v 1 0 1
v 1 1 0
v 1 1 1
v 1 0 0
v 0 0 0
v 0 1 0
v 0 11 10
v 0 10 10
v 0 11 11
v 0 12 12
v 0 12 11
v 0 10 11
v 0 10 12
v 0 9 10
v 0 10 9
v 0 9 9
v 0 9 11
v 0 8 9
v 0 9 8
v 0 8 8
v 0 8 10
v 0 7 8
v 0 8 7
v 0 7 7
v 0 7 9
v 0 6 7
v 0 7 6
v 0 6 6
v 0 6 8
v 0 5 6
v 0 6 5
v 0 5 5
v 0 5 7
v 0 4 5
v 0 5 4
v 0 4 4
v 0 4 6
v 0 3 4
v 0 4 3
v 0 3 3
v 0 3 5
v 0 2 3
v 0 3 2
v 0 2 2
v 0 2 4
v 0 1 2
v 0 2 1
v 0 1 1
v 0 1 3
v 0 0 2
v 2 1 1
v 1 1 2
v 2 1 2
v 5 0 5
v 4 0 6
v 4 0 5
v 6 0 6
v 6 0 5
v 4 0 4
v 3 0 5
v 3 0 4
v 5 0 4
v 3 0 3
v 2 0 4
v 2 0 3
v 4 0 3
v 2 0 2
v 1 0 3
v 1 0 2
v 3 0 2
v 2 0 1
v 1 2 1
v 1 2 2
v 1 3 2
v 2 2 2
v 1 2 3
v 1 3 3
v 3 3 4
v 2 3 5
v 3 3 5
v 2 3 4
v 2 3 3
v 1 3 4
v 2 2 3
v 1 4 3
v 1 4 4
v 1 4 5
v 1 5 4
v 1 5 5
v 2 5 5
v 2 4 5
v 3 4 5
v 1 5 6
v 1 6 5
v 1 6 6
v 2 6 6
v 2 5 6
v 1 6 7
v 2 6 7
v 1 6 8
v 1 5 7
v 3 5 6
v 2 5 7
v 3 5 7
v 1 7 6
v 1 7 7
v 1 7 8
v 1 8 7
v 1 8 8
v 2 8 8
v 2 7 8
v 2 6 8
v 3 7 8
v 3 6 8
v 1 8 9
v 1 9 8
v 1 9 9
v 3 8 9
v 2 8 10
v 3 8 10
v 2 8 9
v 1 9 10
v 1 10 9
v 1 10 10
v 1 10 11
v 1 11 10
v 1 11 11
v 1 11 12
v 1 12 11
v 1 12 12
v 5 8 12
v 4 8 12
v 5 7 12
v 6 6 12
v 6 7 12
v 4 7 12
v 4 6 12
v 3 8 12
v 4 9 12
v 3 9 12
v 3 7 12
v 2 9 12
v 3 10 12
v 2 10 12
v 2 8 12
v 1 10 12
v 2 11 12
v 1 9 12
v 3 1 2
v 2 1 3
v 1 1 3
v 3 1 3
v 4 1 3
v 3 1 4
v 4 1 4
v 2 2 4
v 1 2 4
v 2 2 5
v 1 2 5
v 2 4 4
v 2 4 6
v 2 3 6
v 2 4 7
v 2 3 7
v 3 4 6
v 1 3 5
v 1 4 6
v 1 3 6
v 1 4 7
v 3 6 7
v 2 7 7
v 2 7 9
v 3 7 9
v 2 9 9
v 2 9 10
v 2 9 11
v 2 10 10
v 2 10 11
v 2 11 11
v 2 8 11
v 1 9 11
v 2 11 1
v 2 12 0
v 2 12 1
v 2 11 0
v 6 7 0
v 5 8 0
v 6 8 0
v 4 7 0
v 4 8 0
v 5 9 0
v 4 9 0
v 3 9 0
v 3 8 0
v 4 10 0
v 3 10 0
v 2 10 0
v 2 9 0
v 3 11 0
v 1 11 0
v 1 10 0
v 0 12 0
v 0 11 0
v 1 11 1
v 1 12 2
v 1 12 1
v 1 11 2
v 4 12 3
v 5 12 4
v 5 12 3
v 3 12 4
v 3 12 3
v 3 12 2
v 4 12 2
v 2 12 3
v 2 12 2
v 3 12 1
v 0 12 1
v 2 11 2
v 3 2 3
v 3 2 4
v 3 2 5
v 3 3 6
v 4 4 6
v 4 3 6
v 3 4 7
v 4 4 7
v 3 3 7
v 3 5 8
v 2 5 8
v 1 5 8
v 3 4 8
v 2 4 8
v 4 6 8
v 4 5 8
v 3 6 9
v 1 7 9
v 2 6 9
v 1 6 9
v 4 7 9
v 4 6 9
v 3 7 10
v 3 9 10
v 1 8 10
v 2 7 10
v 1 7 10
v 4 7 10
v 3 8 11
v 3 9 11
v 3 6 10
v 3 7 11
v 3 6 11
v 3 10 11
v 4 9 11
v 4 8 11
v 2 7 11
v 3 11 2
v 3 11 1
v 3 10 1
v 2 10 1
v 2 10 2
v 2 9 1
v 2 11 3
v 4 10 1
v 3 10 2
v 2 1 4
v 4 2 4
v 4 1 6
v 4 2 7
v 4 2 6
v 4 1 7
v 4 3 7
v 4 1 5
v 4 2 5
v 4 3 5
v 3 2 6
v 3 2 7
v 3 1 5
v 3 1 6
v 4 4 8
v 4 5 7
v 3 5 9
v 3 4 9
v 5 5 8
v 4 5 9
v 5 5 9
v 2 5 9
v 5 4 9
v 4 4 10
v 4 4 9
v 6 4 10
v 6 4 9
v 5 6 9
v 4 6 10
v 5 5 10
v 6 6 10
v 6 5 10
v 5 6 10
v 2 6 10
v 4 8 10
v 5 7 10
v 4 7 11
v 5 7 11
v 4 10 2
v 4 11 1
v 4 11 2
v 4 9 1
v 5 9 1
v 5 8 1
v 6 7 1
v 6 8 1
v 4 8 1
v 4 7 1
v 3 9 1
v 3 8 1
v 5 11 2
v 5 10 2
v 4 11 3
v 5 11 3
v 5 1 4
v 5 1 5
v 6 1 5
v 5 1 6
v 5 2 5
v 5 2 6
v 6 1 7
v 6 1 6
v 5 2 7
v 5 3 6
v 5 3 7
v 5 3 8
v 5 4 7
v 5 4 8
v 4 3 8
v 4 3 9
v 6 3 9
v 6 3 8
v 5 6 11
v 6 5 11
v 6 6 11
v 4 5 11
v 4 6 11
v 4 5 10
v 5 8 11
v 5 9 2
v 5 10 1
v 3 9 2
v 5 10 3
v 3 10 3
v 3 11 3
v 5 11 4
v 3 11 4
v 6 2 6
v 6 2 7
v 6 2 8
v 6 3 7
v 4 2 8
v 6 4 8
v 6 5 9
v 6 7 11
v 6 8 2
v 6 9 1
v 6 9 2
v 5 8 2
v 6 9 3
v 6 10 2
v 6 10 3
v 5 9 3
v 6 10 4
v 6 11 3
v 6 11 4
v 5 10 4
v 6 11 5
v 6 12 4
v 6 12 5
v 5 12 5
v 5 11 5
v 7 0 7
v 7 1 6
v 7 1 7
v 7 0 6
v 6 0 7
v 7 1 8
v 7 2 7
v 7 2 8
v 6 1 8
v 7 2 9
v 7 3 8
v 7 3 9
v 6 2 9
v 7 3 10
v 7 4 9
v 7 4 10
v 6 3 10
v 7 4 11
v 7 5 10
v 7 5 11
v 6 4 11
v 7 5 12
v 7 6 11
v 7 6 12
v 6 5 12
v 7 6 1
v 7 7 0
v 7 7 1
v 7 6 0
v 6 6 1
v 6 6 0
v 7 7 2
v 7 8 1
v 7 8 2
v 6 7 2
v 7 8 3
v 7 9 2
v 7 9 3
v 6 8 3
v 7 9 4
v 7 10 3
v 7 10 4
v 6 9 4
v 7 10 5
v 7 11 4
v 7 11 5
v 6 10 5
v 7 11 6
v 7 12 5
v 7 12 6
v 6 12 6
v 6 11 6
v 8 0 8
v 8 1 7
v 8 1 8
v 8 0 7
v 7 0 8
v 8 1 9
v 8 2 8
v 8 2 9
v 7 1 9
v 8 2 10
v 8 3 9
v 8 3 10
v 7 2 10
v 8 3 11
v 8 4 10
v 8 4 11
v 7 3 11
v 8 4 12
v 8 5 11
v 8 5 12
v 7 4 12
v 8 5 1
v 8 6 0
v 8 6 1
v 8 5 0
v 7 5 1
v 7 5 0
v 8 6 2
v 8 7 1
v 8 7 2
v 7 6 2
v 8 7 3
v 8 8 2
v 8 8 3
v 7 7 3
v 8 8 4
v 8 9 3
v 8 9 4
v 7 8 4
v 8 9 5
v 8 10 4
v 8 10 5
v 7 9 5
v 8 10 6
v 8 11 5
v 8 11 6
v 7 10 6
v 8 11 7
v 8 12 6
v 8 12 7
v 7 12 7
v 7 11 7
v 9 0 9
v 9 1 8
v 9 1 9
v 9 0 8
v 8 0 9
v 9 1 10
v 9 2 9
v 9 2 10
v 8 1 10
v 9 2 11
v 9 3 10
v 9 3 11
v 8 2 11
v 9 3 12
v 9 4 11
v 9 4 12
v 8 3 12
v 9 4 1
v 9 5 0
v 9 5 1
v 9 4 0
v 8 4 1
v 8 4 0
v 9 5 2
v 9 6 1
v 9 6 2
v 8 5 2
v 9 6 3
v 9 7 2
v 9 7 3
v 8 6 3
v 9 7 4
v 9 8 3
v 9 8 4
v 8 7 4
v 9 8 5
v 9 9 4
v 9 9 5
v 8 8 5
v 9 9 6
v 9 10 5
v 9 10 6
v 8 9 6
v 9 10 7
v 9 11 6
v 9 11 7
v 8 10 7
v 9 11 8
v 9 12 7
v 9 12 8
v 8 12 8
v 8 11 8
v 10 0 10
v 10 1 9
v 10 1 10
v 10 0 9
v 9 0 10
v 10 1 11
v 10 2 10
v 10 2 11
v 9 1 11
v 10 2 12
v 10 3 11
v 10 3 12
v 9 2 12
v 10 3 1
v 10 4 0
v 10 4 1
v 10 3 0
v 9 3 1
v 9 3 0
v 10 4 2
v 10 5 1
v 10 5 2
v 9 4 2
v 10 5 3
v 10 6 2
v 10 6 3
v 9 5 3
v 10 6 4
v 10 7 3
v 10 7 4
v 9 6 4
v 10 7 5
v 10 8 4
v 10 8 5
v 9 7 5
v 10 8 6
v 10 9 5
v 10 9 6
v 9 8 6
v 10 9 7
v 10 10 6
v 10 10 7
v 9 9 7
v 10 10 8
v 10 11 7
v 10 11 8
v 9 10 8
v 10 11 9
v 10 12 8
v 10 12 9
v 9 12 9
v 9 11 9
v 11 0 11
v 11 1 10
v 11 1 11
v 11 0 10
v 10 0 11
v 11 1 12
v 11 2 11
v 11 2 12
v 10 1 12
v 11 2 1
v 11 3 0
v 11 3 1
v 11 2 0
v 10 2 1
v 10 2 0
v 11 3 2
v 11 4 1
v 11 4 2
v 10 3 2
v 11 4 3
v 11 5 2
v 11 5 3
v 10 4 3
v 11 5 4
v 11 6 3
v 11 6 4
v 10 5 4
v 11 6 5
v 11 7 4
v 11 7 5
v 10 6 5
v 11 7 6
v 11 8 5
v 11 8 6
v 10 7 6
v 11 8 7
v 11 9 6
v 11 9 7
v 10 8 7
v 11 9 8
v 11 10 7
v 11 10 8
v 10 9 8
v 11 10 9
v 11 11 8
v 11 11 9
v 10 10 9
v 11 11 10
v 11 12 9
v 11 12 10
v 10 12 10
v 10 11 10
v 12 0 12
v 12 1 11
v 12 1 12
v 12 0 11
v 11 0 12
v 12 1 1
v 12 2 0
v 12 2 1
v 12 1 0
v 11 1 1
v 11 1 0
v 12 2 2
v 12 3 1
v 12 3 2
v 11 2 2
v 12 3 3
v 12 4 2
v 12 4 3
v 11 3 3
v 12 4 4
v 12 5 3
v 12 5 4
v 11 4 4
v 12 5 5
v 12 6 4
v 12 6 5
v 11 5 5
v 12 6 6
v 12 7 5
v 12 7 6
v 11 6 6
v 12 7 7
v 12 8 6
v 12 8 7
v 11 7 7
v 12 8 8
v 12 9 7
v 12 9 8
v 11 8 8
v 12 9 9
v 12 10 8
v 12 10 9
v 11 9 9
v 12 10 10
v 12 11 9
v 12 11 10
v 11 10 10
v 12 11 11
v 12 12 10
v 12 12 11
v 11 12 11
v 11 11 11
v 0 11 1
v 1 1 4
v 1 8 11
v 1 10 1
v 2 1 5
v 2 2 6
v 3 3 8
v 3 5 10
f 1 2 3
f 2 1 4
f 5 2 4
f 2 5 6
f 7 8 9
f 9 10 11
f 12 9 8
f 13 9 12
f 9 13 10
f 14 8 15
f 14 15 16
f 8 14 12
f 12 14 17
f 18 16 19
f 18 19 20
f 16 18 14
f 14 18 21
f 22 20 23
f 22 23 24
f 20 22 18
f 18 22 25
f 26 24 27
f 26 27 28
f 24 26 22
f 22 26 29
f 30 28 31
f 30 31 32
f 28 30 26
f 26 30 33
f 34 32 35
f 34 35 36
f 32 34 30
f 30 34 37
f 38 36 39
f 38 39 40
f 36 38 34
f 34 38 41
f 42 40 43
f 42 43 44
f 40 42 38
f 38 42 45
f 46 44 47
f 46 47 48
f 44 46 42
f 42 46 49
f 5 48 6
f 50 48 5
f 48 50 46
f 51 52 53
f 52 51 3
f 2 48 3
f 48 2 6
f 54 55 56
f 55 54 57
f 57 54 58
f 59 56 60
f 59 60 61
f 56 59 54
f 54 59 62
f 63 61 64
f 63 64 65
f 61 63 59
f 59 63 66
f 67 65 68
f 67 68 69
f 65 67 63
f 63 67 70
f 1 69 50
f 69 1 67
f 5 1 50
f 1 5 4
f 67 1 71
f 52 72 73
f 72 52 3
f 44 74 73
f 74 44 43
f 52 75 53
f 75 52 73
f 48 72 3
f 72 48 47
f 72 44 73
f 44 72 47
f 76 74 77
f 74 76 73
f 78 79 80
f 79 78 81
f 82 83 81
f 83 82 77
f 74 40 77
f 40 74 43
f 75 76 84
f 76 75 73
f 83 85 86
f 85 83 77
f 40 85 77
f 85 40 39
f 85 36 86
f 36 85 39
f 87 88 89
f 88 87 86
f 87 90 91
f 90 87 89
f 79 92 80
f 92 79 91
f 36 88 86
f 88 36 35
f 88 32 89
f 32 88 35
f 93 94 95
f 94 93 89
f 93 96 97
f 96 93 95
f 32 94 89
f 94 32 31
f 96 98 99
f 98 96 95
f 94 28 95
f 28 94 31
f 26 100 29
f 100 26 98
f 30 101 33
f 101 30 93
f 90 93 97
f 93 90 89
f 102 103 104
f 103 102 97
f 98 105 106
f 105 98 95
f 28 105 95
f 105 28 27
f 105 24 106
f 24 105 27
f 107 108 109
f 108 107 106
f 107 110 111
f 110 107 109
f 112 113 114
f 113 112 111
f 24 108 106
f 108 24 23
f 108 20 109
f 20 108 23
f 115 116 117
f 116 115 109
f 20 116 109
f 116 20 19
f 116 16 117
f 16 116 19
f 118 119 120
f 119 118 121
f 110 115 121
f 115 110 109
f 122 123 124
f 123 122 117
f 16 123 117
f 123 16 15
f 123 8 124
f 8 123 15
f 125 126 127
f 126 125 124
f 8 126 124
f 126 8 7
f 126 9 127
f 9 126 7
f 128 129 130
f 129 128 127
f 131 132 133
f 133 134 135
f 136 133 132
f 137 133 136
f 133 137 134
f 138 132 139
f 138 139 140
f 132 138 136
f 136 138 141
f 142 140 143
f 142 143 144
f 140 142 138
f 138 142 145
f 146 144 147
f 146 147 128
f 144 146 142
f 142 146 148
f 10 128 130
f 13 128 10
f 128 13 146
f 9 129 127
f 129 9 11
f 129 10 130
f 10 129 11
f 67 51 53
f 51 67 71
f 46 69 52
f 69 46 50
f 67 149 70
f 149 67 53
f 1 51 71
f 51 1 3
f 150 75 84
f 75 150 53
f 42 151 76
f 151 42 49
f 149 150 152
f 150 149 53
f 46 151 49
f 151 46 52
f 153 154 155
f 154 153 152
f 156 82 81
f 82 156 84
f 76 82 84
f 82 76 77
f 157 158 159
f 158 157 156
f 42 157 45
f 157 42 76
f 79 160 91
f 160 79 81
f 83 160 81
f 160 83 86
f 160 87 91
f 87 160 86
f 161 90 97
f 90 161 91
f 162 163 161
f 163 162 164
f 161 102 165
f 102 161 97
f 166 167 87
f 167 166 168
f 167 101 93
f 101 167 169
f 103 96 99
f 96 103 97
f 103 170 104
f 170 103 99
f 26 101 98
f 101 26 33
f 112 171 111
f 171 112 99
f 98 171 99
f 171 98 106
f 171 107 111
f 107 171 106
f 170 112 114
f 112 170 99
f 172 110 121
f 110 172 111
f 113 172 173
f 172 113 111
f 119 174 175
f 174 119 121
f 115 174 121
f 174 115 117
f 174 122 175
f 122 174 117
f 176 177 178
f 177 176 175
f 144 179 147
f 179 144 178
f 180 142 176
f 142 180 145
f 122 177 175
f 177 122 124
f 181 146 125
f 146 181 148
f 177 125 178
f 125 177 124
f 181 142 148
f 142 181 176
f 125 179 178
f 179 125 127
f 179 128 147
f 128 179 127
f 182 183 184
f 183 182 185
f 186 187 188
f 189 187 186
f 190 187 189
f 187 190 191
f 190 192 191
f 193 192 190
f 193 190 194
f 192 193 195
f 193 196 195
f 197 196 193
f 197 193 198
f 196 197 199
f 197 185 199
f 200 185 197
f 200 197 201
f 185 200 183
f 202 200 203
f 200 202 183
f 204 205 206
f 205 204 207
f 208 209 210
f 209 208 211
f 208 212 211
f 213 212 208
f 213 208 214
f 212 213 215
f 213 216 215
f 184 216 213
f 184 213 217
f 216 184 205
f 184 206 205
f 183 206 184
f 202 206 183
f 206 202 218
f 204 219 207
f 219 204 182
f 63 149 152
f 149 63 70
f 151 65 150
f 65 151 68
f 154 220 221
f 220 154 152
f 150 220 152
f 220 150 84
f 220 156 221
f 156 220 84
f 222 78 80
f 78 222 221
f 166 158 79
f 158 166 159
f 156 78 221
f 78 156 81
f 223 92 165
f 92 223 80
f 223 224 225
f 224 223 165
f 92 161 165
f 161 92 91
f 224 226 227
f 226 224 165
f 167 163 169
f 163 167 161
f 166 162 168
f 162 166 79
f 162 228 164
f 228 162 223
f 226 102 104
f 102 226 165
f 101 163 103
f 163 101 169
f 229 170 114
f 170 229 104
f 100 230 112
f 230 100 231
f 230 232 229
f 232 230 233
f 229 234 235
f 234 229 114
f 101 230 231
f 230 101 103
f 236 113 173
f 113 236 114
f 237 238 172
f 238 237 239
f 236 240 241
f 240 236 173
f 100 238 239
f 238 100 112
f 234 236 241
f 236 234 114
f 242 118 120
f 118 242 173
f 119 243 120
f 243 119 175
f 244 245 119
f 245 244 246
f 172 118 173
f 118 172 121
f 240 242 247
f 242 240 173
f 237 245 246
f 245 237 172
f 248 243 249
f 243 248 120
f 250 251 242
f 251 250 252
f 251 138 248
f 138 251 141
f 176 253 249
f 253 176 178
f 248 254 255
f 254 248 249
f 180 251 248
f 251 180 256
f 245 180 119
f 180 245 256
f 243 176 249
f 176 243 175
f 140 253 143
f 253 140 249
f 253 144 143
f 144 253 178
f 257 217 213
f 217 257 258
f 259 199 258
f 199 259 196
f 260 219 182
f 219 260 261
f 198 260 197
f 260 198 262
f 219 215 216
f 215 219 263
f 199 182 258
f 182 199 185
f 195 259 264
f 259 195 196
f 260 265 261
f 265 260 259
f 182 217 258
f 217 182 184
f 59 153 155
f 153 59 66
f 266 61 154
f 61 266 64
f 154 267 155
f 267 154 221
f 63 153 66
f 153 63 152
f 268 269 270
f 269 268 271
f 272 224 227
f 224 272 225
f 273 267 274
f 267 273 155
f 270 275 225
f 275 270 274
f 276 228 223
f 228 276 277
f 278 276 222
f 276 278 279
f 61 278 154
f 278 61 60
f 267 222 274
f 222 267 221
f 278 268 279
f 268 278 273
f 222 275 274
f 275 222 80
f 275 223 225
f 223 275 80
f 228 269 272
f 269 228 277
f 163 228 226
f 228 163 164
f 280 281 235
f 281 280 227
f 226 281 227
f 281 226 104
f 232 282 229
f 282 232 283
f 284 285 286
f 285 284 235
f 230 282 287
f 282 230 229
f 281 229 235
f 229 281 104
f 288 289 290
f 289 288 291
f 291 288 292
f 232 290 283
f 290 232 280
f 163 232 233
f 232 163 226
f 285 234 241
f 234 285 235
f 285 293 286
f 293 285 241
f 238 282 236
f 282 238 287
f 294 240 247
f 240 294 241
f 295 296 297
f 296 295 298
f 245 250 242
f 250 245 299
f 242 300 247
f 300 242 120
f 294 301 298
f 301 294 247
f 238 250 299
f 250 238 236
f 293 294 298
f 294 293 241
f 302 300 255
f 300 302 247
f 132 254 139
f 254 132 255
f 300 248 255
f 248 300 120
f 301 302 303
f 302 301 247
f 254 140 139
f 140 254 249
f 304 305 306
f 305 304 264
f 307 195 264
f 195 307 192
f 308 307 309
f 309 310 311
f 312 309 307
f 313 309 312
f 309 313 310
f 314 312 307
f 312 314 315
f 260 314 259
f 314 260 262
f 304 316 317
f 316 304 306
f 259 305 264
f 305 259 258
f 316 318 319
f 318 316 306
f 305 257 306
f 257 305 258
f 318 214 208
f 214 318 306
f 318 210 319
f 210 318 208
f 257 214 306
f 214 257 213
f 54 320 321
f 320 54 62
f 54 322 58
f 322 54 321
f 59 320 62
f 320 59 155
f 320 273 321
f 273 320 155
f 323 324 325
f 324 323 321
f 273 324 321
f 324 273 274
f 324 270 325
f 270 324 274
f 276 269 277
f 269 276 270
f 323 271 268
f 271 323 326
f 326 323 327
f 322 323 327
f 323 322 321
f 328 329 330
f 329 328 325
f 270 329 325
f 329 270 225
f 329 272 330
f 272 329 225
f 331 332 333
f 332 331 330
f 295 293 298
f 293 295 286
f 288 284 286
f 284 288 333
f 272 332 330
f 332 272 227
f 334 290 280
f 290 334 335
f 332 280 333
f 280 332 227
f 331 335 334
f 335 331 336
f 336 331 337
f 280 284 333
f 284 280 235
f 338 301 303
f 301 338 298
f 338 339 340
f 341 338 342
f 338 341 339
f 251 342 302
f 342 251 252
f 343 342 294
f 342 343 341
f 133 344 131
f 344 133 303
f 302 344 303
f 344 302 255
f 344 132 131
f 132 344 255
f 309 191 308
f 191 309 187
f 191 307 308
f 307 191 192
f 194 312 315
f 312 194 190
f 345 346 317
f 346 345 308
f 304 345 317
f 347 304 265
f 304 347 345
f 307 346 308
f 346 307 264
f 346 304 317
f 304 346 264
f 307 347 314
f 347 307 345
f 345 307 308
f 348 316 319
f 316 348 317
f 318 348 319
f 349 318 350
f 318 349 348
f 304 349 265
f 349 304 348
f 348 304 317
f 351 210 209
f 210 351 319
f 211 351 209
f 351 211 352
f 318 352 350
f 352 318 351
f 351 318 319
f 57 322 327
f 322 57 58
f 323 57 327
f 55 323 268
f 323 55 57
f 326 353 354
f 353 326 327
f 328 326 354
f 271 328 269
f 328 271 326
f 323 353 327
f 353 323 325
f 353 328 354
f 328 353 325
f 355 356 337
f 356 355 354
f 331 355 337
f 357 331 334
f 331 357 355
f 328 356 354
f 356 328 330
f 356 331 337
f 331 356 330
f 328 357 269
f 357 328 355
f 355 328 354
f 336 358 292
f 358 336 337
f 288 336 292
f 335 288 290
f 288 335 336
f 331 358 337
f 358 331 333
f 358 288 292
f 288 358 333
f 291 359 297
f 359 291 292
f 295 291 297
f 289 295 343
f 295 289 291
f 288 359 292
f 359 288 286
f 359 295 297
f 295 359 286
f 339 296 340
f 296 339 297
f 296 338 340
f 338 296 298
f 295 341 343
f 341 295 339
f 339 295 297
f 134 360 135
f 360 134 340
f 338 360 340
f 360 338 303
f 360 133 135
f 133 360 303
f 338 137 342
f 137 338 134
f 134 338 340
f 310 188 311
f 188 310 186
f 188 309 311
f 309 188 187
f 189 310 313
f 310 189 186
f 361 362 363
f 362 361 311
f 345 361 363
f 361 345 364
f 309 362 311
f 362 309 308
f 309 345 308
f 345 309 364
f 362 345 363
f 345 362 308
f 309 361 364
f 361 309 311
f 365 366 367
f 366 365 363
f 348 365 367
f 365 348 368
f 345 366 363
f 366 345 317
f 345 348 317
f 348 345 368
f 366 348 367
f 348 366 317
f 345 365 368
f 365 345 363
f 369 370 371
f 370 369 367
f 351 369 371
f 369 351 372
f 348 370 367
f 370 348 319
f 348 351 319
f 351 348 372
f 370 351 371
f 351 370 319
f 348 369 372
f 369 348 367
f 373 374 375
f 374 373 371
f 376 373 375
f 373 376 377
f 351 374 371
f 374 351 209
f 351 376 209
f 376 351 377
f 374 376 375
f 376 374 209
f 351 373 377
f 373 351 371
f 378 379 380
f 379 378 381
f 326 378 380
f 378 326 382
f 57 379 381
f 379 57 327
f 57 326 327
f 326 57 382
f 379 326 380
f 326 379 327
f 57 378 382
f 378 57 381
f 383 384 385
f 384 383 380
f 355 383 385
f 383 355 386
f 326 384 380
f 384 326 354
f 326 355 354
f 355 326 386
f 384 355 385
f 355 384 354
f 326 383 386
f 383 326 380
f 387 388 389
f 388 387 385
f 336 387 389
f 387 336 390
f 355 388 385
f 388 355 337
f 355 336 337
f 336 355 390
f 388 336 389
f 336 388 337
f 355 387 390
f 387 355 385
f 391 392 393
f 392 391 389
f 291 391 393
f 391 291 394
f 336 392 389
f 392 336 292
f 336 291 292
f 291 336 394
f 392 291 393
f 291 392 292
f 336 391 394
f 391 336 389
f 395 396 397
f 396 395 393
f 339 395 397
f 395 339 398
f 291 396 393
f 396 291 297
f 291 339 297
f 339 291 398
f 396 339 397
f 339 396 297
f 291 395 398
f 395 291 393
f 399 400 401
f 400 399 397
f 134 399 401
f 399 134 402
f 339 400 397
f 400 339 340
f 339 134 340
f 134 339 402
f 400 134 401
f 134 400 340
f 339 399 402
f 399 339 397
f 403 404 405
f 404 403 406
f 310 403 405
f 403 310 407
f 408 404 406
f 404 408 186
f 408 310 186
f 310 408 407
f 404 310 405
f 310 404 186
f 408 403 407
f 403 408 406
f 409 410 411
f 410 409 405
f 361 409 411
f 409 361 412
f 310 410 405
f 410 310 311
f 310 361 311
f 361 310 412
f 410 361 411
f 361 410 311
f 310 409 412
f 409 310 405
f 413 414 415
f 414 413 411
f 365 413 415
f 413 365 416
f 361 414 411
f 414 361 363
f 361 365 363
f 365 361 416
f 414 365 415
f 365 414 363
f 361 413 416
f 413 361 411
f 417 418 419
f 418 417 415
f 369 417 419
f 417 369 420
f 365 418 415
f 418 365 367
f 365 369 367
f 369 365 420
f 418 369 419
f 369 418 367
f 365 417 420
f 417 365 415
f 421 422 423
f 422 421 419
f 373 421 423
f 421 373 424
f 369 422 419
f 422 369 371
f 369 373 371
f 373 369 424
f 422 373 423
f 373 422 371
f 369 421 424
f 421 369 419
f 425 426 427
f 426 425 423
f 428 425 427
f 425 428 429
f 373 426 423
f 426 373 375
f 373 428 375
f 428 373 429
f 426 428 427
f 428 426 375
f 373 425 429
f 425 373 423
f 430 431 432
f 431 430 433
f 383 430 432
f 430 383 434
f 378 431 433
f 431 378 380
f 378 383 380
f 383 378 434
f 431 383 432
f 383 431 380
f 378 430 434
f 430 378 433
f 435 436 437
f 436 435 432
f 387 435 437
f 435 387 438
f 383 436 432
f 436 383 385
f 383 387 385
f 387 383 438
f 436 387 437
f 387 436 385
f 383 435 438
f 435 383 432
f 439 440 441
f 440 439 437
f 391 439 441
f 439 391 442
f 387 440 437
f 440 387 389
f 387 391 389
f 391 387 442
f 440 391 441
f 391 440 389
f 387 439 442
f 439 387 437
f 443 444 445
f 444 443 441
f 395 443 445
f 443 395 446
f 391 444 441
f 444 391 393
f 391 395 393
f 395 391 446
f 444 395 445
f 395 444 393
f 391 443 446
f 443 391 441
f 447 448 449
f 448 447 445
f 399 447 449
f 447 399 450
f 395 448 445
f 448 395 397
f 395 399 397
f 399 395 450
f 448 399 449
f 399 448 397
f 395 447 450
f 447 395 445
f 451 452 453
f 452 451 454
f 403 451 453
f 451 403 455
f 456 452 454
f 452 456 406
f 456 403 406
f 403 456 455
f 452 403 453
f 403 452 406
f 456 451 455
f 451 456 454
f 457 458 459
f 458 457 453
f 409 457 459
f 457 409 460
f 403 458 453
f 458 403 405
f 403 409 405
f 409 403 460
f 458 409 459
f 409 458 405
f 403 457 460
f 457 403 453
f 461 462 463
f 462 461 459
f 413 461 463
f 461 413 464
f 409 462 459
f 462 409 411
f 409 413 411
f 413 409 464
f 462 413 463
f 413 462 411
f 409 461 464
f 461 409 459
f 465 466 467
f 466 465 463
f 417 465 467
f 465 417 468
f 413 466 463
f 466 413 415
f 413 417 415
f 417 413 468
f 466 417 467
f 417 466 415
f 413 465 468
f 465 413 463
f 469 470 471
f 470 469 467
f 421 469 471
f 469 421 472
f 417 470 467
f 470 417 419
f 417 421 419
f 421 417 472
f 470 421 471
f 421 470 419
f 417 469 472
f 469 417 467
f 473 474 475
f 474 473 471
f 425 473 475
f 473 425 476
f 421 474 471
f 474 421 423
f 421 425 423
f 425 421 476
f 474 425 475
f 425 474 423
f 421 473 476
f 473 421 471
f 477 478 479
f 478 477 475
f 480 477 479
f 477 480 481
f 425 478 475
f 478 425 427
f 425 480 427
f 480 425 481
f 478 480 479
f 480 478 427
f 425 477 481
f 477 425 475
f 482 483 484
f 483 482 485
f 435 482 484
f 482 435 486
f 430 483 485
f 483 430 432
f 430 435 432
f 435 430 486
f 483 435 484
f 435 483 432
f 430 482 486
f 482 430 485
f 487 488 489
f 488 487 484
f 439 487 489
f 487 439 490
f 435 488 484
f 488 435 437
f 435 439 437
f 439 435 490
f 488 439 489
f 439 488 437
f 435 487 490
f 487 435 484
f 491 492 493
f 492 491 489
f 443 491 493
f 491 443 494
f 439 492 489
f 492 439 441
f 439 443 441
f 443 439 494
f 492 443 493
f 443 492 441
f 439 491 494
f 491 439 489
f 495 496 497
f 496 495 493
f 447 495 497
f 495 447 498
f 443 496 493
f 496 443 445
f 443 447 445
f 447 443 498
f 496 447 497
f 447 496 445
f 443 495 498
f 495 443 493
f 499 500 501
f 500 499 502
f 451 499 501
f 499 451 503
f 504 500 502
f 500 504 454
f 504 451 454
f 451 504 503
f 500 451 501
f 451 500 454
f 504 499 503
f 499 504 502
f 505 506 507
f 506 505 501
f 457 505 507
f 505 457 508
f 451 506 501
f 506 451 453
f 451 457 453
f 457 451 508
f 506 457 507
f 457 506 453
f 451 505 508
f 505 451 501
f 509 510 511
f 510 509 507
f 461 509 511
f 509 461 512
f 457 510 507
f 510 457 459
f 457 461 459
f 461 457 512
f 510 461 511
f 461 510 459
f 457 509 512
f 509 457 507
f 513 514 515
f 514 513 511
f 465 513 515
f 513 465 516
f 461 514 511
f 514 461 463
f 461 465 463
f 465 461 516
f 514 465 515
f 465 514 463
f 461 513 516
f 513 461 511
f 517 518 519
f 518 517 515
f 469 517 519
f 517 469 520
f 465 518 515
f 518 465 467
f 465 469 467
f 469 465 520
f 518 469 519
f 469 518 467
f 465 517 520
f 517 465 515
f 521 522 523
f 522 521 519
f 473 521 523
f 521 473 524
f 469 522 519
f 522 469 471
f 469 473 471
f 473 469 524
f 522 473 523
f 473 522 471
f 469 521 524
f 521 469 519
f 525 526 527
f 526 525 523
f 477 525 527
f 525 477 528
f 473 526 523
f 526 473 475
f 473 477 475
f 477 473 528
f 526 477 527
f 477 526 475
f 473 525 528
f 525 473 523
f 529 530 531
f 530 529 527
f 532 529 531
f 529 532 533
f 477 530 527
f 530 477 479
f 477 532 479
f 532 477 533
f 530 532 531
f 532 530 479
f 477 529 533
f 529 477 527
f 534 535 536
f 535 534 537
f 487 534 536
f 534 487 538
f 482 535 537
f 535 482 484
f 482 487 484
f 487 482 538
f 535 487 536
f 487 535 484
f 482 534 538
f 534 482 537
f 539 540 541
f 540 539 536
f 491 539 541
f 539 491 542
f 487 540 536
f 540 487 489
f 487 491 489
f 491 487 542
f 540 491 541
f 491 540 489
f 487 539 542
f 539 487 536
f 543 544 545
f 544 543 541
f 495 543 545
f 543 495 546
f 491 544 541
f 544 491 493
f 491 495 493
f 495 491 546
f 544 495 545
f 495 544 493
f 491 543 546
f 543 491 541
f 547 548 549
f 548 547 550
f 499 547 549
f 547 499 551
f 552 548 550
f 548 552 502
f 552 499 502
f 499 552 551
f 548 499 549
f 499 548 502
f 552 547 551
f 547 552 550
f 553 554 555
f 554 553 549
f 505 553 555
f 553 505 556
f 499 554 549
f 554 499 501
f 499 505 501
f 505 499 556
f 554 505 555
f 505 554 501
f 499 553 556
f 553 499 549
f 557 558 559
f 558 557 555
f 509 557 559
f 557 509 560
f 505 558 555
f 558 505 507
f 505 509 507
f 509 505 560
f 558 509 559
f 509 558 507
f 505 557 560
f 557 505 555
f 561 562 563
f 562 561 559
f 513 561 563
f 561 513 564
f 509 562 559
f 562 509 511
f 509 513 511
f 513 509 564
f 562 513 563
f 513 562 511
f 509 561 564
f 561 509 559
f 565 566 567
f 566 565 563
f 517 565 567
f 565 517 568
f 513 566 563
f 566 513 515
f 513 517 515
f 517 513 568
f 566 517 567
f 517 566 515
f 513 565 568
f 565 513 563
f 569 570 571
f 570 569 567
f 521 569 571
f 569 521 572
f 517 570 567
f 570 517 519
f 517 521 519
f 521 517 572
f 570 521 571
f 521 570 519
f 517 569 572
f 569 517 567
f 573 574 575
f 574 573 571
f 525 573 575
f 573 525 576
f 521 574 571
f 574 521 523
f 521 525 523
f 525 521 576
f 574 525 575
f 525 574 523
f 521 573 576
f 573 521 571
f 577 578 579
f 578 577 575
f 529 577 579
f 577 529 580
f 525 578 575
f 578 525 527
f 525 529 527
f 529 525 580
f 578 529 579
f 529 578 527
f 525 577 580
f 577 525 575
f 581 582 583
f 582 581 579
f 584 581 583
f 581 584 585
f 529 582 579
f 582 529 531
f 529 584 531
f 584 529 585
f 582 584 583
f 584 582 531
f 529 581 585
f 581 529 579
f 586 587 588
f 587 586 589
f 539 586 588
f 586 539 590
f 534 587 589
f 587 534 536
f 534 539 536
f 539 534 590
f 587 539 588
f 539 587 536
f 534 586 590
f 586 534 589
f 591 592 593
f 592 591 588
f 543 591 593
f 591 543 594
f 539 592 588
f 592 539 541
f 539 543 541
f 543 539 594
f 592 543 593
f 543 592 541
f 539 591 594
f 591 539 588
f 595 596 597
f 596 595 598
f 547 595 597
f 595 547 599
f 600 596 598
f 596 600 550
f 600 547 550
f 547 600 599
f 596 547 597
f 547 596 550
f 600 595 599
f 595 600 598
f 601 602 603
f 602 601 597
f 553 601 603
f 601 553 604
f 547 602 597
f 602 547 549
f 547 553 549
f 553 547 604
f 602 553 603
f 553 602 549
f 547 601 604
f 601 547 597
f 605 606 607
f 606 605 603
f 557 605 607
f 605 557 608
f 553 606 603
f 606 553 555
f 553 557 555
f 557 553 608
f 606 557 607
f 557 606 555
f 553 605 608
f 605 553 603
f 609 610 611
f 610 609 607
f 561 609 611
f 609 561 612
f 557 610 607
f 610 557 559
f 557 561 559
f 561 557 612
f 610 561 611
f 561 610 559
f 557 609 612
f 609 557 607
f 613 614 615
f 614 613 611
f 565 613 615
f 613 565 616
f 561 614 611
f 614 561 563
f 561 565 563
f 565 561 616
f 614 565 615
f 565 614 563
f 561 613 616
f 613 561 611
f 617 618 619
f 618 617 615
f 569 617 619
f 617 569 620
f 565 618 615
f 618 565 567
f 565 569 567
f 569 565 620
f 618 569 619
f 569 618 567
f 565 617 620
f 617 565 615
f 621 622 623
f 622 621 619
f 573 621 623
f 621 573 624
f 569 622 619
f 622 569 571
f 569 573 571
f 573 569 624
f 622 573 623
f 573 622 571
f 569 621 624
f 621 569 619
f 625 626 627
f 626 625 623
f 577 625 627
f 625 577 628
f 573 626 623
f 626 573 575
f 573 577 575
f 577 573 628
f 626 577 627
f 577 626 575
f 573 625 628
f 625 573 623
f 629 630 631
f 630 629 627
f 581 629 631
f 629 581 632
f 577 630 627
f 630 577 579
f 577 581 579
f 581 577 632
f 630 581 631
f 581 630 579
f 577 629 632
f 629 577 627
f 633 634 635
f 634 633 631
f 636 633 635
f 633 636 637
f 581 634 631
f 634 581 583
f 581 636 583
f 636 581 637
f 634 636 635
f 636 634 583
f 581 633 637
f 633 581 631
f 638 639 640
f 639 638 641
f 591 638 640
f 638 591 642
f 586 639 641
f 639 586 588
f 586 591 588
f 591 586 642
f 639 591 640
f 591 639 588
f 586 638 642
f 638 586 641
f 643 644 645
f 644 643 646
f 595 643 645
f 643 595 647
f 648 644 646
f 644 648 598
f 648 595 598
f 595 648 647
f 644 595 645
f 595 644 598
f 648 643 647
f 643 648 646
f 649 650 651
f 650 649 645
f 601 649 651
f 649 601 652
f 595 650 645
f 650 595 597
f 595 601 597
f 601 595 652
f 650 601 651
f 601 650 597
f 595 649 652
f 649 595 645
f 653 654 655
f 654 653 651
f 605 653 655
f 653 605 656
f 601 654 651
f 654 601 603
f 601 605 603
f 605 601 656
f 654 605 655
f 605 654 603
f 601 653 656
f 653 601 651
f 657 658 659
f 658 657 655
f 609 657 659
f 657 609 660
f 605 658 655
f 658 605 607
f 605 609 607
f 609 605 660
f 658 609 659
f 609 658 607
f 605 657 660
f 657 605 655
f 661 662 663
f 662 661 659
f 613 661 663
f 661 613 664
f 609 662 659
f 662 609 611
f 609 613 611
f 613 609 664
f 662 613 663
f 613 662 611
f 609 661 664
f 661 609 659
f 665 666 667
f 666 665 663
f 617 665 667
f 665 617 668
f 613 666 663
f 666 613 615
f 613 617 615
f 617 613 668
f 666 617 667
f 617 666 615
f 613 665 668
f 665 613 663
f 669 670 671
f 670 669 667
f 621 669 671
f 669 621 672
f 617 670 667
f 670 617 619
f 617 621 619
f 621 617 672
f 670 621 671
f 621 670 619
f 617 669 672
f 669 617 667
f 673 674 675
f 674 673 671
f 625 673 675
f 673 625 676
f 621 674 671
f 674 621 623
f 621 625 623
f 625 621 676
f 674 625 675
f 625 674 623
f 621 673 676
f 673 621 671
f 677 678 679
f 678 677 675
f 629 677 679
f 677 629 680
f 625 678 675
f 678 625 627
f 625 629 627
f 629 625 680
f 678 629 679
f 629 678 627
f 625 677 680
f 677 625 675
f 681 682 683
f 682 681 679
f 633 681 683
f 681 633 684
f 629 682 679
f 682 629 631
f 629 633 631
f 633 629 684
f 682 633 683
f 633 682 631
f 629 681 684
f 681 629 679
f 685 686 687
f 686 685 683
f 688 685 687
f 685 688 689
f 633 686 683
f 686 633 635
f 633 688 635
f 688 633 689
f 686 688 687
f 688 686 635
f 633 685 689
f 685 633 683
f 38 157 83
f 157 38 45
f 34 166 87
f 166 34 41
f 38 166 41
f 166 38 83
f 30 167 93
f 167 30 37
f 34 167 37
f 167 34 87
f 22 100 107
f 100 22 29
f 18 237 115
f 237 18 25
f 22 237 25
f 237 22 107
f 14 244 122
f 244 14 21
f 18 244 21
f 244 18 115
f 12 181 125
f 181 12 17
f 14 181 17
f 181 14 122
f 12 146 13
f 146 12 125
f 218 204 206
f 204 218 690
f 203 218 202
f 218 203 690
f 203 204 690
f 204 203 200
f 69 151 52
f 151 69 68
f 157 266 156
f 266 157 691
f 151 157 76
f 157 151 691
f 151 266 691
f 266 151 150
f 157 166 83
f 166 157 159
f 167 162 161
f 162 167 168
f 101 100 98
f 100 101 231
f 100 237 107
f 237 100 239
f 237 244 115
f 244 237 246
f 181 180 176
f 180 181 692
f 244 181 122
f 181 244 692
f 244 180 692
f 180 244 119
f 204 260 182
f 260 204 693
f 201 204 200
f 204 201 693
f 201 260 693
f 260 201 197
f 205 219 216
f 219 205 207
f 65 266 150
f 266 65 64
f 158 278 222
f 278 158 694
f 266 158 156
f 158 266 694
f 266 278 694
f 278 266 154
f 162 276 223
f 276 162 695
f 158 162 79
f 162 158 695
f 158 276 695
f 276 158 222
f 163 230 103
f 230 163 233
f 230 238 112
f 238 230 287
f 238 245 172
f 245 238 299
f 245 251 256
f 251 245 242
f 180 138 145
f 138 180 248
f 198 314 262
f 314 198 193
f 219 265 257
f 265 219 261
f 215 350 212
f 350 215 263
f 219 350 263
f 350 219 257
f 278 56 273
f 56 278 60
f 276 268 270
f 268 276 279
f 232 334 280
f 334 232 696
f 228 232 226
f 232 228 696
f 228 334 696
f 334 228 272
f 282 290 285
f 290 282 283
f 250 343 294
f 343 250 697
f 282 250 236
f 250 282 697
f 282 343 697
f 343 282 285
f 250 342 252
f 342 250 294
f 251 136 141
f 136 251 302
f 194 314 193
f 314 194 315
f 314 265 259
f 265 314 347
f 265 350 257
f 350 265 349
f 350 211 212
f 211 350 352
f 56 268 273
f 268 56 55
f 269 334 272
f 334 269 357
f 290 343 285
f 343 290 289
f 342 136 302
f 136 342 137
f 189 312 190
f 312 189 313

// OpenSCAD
union() {
    translate([0.0, 0.0, 0.0]) cube([1, 1, 1]);
    translate([0.0, 1.0, 1.0]) cube([1, 1, 1]);
    translate([0.0, 2.0, 2.0]) cube([1, 1, 1]);
    translate([0.0, 3.0, 3.0]) cube([1, 1, 1]);
    translate([0.0, 4.0, 4.0]) cube([1, 1, 1]);
    translate([0.0, 5.0, 5.0]) cube([1, 1, 1]);
    translate([0.0, 6.0, 6.0]) cube([1, 1, 1]);
    translate([0.0, 7.0, 7.0]) cube([1, 1, 1]);
    translate([0.0, 8.0, 8.0]) cube([1, 1, 1]);
    translate([0.0, 9.0, 9.0]) cube([1, 1, 1]);
    translate([0.0, 10.0, 10.0]) cube([1, 1, 1]);
    translate([0.0, 11.0, 11.0]) cube([1, 1, 1]);
    translate([1.0, 0.0, 1.0]) cube([1, 1, 1]);
    translate([1.0, 1.0, 2.0]) cube([1, 1, 1]);
    translate([1.0, 2.0, 3.0]) cube([1, 1, 1]);
    translate([1.0, 3.0, 4.0]) cube([1, 1, 1]);
    translate([1.0, 4.0, 5.0]) cube([1, 1, 1]);
    translate([1.0, 5.0, 6.0]) cube([1, 1, 1]);
    translate([1.0, 6.0, 7.0]) cube([1, 1, 1]);
    translate([1.0, 7.0, 8.0]) cube([1, 1, 1]);
    translate([1.0, 8.0, 9.0]) cube([1, 1, 1]);
    translate([1.0, 9.0, 10.0]) cube([1, 1, 1]);
    translate([1.0, 10.0, 11.0]) cube([1, 1, 1]);
    translate([1.0, 11.0, 0.0]) cube([1, 1, 1]);
    translate([2.0, 0.0, 2.0]) cube([1, 1, 1]);
    translate([2.0, 1.0, 3.0]) cube([1, 1, 1]);
    translate([2.0, 2.0, 4.0]) cube([1, 1, 1]);
    translate([2.0, 3.0, 5.0]) cube([1, 1, 1]);
    translate([2.0, 4.0, 6.0]) cube([1, 1, 1]);
    translate([2.0, 5.0, 7.0]) cube([1, 1, 1]);
    translate([2.0, 6.0, 8.0]) cube([1, 1, 1]);
    translate([2.0, 7.0, 9.0]) cube([1, 1, 1]);
    translate([2.0, 8.0, 10.0]) cube([1, 1, 1]);
    translate([2.0, 9.0, 11.0]) cube([1, 1, 1]);
    translate([2.0, 10.0, 0.0]) cube([1, 1, 1]);
    translate([2.0, 11.0, 1.0]) cube([1, 1, 1]);
    translate([3.0, 0.0, 3.0]) cube([1, 1, 1]);
    translate([3.0, 1.0, 4.0]) cube([1, 1, 1]);
    translate([3.0, 2.0, 5.0]) cube([1, 1, 1]);
    translate([3.0, 3.0, 6.0]) cube([1, 1, 1]);
    translate([3.0, 4.0, 7.0]) cube([1, 1, 1]);
    translate([3.0, 5.0, 8.0]) cube([1, 1, 1]);
    translate([3.0, 6.0, 9.0]) cube([1, 1, 1]);
    translate([3.0, 7.0, 10.0]) cube([1, 1, 1]);
    translate([3.0, 8.0, 11.0]) cube([1, 1, 1]);
    translate([3.0, 9.0, 0.0]) cube([1, 1, 1]);
    translate([3.0, 10.0, 1.0]) cube([1, 1, 1]);
    translate([3.0, 11.0, 2.0]) cube([1, 1, 1]);
    translate([4.0, 0.0, 4.0]) cube([1, 1, 1]);
    translate([4.0, 1.0, 5.0]) cube([1, 1, 1]);
    translate([4.0, 2.0, 6.0]) cube([1, 1, 1]);
    translate([4.0, 3.0, 7.0]) cube([1, 1, 1]);
    translate([4.0, 4.0, 8.0]) cube([1, 1, 1]);
    translate([4.0, 5.0, 9.0]) cube([1, 1, 1]);
    translate([4.0, 6.0, 10.0]) cube([1, 1, 1]);
    translate([4.0, 7.0, 11.0]) cube([1, 1, 1]);
    translate([4.0, 8.0, 0.0]) cube([1, 1, 1]);
    translate([4.0, 9.0, 1.0]) cube([1, 1, 1]);
    translate([4.0, 10.0, 2.0]) cube([1, 1, 1]);
    translate([4.0, 11.0, 3.0]) cube([1, 1, 1]);
    translate([5.0, 0.0, 5.0]) cube([1, 1, 1]);
    translate([5.0, 1.0, 6.0]) cube([1, 1, 1]);
    translate([5.0, 2.0, 7.0]) cube([1, 1, 1]);
    translate([5.0, 3.0, 8.0]) cube([1, 1, 1]);
    translate([5.0, 4.0, 9.0]) cube([1, 1, 1]);
    translate([5.0, 5.0, 10.0]) cube([1, 1, 1]);
    translate([5.0, 6.0, 11.0]) cube([1, 1, 1]);
    translate([5.0, 7.0, 0.0]) cube([1, 1, 1]);
    translate([5.0, 8.0, 1.0]) cube([1, 1, 1]);
    translate([5.0, 9.0, 2.0]) cube([1, 1, 1]);
    translate([5.0, 10.0, 3.0]) cube([1, 1, 1]);
    translate([5.0, 11.0, 4.0]) cube([1, 1, 1]);
    translate([6.0, 0.0, 6.0]) cube([1, 1, 1]);
    translate([6.0, 1.0, 7.0]) cube([1, 1, 1]);
    translate([6.0, 2.0, 8.0]) cube([1, 1, 1]);
    translate([6.0, 3.0, 9.0]) cube([1, 1, 1]);
    translate([6.0, 4.0, 10.0]) cube([1, 1, 1]);
    translate([6.0, 5.0, 11.0]) cube([1, 1, 1]);
    translate([6.0, 6.0, 0.0]) cube([1, 1, 1]);
    translate([6.0, 7.0, 1.0]) cube([1, 1, 1]);
    translate([6.0, 8.0, 2.0]) cube([1, 1, 1]);
    translate([6.0, 9.0, 3.0]) cube([1, 1, 1]);
    translate([6.0, 10.0, 4.0]) cube([1, 1, 1]);
    translate([6.0, 11.0, 5.0]) cube([1, 1, 1]);
    translate([7.0, 0.0, 7.0]) cube([1, 1, 1]);
    translate([7.0, 1.0, 8.0]) cube([1, 1, 1]);
    translate([7.0, 2.0, 9.0]) cube([1, 1, 1]);
    translate([7.0, 3.0, 10.0]) cube([1, 1, 1]);
    translate([7.0, 4.0, 11.0]) cube([1, 1, 1]);
    translate([7.0, 5.0, 0.0]) cube([1, 1, 1]);
    translate([7.0, 6.0, 1.0]) cube([1, 1, 1]);
    translate([7.0, 7.0, 2.0]) cube([1, 1, 1]);
    translate([7.0, 8.0, 3.0]) cube([1, 1, 1]);
    translate([7.0, 9.0, 4.0]) cube([1, 1, 1]);
    translate([7.0, 10.0, 5.0]) cube([1, 1, 1]);
    translate([7.0, 11.0, 6.0]) cube([1, 1, 1]);
    translate([8.0, 0.0, 8.0]) cube([1, 1, 1]);
    translate([8.0, 1.0, 9.0]) cube([1, 1, 1]);
    translate([8.0, 2.0, 10.0]) cube([1, 1, 1]);
    translate([8.0, 3.0, 11.0]) cube([1, 1, 1]);
    translate([8.0, 4.0, 0.0]) cube([1, 1, 1]);
    translate([8.0, 5.0, 1.0]) cube([1, 1, 1]);
    translate([8.0, 6.0, 2.0]) cube([1, 1, 1]);
    translate([8.0, 7.0, 3.0]) cube([1, 1, 1]);
    translate([8.0, 8.0, 4.0]) cube([1, 1, 1]);
    translate([8.0, 9.0, 5.0]) cube([1, 1, 1]);
    translate([8.0, 10.0, 6.0]) cube([1, 1, 1]);
    translate([8.0, 11.0, 7.0]) cube([1, 1, 1]);
    translate([9.0, 0.0, 9.0]) cube([1, 1, 1]);
    translate([9.0, 1.0, 10.0]) cube([1, 1, 1]);
    translate([9.0, 2.0, 11.0]) cube([1, 1, 1]);
    translate([9.0, 3.0, 0.0]) cube([1, 1, 1]);
    translate([9.0, 4.0, 1.0]) cube([1, 1, 1]);
    translate([9.0, 5.0, 2.0]) cube([1, 1, 1]);
    translate([9.0, 6.0, 3.0]) cube([1, 1, 1]);
    translate([9.0, 7.0, 4.0]) cube([1, 1, 1]);
    translate([9.0, 8.0, 5.0]) cube([1, 1, 1]);
    translate([9.0, 9.0, 6.0]) cube([1, 1, 1]);
    translate([9.0, 10.0, 7.0]) cube([1, 1, 1]);
    translate([9.0, 11.0, 8.0]) cube([1, 1, 1]);
    translate([10.0, 0.0, 10.0]) cube([1, 1, 1]);
    translate([10.0, 1.0, 11.0]) cube([1, 1, 1]);
    translate([10.0, 2.0, 0.0]) cube([1, 1, 1]);
    translate([10.0, 3.0, 1.0]) cube([1, 1, 1]);
    translate([10.0, 4.0, 2.0]) cube([1, 1, 1]);
    translate([10.0, 5.0, 3.0]) cube([1, 1, 1]);
    translate([10.0, 6.0, 4.0]) cube([1, 1, 1]);
    translate([10.0, 7.0, 5.0]) cube([1, 1, 1]);
    translate([10.0, 8.0, 6.0]) cube([1, 1, 1]);
    translate([10.0, 9.0, 7.0]) cube([1, 1, 1]);
    translate([10.0, 10.0, 8.0]) cube([1, 1, 1]);
    translate([10.0, 11.0, 9.0]) cube([1, 1, 1]);
    translate([11.0, 0.0, 11.0]) cube([1, 1, 1]);
    translate([11.0, 1.0, 0.0]) cube([1, 1, 1]);
    translate([11.0, 2.0, 1.0]) cube([1, 1, 1]);
    translate([11.0, 3.0, 2.0]) cube([1, 1, 1]);
    translate([11.0, 4.0, 3.0]) cube([1, 1, 1]);
    translate([11.0, 5.0, 4.0]) cube([1, 1, 1]);
    translate([11.0, 6.0, 5.0]) cube([1, 1, 1]);
    translate([11.0, 7.0, 6.0]) cube([1, 1, 1]);
    translate([11.0, 8.0, 7.0]) cube([1, 1, 1]);
    translate([11.0, 9.0, 8.0]) cube([1, 1, 1]);
    translate([11.0, 10.0, 9.0]) cube([1, 1, 1]);
    translate([11.0, 11.0, 10.0]) cube([1, 1, 1]);
    translate([0.0, 0.0, 1.0]) cube([1, 1, 1]);
    translate([0.0, 1.0, 2.0]) cube([1, 1, 1]);
    translate([0.0, 2.0, 3.0]) cube([1, 1, 1]);
    translate([0.0, 3.0, 4.0]) cube([1, 1, 1]);
    translate([0.0, 4.0, 5.0]) cube([1, 1, 1]);
    translate([0.0, 5.0, 6.0]) cube([1, 1, 1]);
    translate([0.0, 6.0, 7.0]) cube([1, 1, 1]);
    translate([0.0, 7.0, 8.0]) cube([1, 1, 1]);
    translate([0.0, 8.0, 9.0]) cube([1, 1, 1]);
    translate([0.0, 9.0, 10.0]) cube([1, 1, 1]);
    translate([0.0, 10.0, 11.0]) cube([1, 1, 1]);
    translate([0.0, 11.0, 0.0]) cube([1, 1, 1]);
    translate([1.0, 0.0, 2.0]) cube([1, 1, 1]);
    translate([1.0, 1.0, 3.0]) cube([1, 1, 1]);
    translate([1.0, 2.0, 4.0]) cube([1, 1, 1]);
    translate([1.0, 3.0, 5.0]) cube([1, 1, 1]);
    translate([1.0, 4.0, 6.0]) cube([1, 1, 1]);
    translate([1.0, 5.0, 7.0]) cube([1, 1, 1]);
    translate([1.0, 6.0, 8.0]) cube([1, 1, 1]);
    translate([1.0, 7.0, 9.0]) cube([1, 1, 1]);
    translate([1.0, 8.0, 10.0]) cube([1, 1, 1]);
    translate([1.0, 9.0, 11.0]) cube([1, 1, 1]);
    translate([1.0, 10.0, 0.0]) cube([1, 1, 1]);
    translate([1.0, 11.0, 1.0]) cube([1, 1, 1]);
    translate([2.0, 0.0, 3.0]) cube([1, 1, 1]);
    translate([2.0, 1.0, 4.0]) cube([1, 1, 1]);
    translate([2.0, 2.0, 5.0]) cube([1, 1, 1]);
    translate([2.0, 3.0, 6.0]) cube([1, 1, 1]);
    translate([2.0, 4.0, 7.0]) cube([1, 1, 1]);
    translate([2.0, 5.0, 8.0]) cube([1, 1, 1]);
    translate([2.0, 6.0, 9.0]) cube([1, 1, 1]);
    translate([2.0, 7.0, 10.0]) cube([1, 1, 1]);
    translate([2.0, 8.0, 11.0]) cube([1, 1, 1]);
    translate([2.0, 9.0, 0.0]) cube([1, 1, 1]);
    translate([2.0, 10.0, 1.0]) cube([1, 1, 1]);
    translate([2.0, 11.0, 2.0]) cube([1, 1, 1]);
    translate([3.0, 0.0, 4.0]) cube([1, 1, 1]);
    translate([3.0, 1.0, 5.0]) cube([1, 1, 1]);
    translate([3.0, 2.0, 6.0]) cube([1, 1, 1]);
    translate([3.0, 3.0, 7.0]) cube([1, 1, 1]);
    translate([3.0, 4.0, 8.0]) cube([1, 1, 1]);
    translate([3.0, 5.0, 9.0]) cube([1, 1, 1]);
    translate([3.0, 6.0, 10.0]) cube([1, 1, 1]);
    translate([3.0, 7.0, 11.0]) cube([1, 1, 1]);
    translate([3.0, 8.0, 0.0]) cube([1, 1, 1]);
    translate([3.0, 9.0, 1.0]) cube([1, 1, 1]);
    translate([3.0, 10.0, 2.0]) cube([1, 1, 1]);
    translate([3.0, 11.0, 3.0]) cube([1, 1, 1]);
    translate([4.0, 0.0, 5.0]) cube([1, 1, 1]);
    translate([4.0, 1.0, 6.0]) cube([1, 1, 1]);
    translate([4.0, 2.0, 7.0]) cube([1, 1, 1]);
    translate([4.0, 3.0, 8.0]) cube([1, 1, 1]);
    translate([4.0, 4.0, 9.0]) cube([1, 1, 1]);
    translate([4.0, 5.0, 10.0]) cube([1, 1, 1]);
    translate([4.0, 6.0, 11.0]) cube([1, 1, 1]);
    translate([4.0, 7.0, 0.0]) cube([1, 1, 1]);
}
